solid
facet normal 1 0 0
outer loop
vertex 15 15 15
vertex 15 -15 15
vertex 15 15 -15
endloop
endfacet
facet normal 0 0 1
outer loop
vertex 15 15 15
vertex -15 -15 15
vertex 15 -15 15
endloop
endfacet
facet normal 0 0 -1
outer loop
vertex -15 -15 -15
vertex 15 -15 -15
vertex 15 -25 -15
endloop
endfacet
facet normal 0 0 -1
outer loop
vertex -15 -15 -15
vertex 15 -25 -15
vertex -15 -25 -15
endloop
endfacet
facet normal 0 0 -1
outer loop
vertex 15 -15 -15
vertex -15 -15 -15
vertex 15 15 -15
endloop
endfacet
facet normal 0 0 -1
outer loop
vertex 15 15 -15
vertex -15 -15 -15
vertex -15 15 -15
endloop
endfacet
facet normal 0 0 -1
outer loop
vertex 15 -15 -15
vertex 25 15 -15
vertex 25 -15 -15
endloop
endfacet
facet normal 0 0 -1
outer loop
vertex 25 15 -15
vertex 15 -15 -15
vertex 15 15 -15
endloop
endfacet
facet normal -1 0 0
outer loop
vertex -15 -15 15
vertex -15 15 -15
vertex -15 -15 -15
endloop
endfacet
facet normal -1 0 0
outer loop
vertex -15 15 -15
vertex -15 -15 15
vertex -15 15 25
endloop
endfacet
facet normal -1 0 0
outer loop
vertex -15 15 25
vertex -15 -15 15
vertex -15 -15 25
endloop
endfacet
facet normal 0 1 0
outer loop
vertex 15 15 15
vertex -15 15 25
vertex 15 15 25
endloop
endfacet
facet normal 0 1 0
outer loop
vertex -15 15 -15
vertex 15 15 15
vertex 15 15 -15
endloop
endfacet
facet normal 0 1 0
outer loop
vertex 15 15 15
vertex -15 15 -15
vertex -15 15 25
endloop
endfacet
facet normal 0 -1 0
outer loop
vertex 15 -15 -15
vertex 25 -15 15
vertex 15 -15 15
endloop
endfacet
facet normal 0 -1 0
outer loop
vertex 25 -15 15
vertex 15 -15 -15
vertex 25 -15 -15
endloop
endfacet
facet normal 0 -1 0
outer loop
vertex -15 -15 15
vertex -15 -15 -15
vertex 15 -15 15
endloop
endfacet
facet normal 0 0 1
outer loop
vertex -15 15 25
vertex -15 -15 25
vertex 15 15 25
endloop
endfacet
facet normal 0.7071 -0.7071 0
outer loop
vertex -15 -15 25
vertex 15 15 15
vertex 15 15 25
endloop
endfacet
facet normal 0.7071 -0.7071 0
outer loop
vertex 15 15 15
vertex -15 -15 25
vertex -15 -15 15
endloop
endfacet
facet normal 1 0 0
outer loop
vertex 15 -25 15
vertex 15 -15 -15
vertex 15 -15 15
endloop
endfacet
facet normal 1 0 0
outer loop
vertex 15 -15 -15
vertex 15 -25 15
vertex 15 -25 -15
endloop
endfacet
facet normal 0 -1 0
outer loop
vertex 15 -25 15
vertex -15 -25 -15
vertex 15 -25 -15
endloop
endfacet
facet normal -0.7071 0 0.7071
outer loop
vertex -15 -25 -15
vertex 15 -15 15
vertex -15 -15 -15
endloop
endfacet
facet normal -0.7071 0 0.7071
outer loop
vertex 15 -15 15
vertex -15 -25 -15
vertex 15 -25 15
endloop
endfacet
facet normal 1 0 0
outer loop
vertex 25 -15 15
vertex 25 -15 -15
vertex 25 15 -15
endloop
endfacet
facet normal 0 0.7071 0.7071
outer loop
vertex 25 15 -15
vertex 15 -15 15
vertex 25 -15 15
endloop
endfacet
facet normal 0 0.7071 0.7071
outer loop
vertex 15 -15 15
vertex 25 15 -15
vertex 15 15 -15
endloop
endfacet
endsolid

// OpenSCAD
module default()
{
	cube([30, 30, 30],center=true);
}

module triangle()
{
translate ([-15,-15,0])
 polyhedron(
  points=[ [0,0,0], [30,0,0], [0,30,0], 
           [0,0,10],[30,0,10],[0,30,10]  ],
  faces=[ [0,1,2],[5,4,3], 
			 [3,1,0],[4,1,3],  [4,2,1],[5,2, 4], [2,5,0],[5,3,0] ]
 );

}



module wuerfel(a=[0,0,0]){
  union(){
    default();
    color([1,0,0])	rotate([0,0,0])	translate([0,0,15])	rotate([0,0,(a[0])*90])	triangle();
    color([0,1,0])	rotate([90,0,0])	translate([0,0,15])	rotate([0,0,(a[1])*90])	triangle();
    color([0,0,1])	rotate([0,90,0])	translate([0,0,15])	rotate([0,0,(a[2])*90])	triangle();
  }
}


for ( i = [0 : 3] )
{
 for ( j = [0 : 3] )
 {
  for ( k = [0 : 3] )
  {
//	translate([i*70,j*70,k*70]) wuerfel([i,j,k]);
  }
 }
}


for(i=[
 [3, 1, 1], //
 [1, 1, 1], //
 [1, 1, 2], //
 [1, 4, 1], //
 [2, 1, 2], //
 [2, 1, 4], //
 [1, 4, 3], //
 [2, 4, 4]  //
 
 ])
{
//  translate(50*i)  wuerfel(i);	//rot, gruen, blau

}

wuerfel([3,1,1]);
